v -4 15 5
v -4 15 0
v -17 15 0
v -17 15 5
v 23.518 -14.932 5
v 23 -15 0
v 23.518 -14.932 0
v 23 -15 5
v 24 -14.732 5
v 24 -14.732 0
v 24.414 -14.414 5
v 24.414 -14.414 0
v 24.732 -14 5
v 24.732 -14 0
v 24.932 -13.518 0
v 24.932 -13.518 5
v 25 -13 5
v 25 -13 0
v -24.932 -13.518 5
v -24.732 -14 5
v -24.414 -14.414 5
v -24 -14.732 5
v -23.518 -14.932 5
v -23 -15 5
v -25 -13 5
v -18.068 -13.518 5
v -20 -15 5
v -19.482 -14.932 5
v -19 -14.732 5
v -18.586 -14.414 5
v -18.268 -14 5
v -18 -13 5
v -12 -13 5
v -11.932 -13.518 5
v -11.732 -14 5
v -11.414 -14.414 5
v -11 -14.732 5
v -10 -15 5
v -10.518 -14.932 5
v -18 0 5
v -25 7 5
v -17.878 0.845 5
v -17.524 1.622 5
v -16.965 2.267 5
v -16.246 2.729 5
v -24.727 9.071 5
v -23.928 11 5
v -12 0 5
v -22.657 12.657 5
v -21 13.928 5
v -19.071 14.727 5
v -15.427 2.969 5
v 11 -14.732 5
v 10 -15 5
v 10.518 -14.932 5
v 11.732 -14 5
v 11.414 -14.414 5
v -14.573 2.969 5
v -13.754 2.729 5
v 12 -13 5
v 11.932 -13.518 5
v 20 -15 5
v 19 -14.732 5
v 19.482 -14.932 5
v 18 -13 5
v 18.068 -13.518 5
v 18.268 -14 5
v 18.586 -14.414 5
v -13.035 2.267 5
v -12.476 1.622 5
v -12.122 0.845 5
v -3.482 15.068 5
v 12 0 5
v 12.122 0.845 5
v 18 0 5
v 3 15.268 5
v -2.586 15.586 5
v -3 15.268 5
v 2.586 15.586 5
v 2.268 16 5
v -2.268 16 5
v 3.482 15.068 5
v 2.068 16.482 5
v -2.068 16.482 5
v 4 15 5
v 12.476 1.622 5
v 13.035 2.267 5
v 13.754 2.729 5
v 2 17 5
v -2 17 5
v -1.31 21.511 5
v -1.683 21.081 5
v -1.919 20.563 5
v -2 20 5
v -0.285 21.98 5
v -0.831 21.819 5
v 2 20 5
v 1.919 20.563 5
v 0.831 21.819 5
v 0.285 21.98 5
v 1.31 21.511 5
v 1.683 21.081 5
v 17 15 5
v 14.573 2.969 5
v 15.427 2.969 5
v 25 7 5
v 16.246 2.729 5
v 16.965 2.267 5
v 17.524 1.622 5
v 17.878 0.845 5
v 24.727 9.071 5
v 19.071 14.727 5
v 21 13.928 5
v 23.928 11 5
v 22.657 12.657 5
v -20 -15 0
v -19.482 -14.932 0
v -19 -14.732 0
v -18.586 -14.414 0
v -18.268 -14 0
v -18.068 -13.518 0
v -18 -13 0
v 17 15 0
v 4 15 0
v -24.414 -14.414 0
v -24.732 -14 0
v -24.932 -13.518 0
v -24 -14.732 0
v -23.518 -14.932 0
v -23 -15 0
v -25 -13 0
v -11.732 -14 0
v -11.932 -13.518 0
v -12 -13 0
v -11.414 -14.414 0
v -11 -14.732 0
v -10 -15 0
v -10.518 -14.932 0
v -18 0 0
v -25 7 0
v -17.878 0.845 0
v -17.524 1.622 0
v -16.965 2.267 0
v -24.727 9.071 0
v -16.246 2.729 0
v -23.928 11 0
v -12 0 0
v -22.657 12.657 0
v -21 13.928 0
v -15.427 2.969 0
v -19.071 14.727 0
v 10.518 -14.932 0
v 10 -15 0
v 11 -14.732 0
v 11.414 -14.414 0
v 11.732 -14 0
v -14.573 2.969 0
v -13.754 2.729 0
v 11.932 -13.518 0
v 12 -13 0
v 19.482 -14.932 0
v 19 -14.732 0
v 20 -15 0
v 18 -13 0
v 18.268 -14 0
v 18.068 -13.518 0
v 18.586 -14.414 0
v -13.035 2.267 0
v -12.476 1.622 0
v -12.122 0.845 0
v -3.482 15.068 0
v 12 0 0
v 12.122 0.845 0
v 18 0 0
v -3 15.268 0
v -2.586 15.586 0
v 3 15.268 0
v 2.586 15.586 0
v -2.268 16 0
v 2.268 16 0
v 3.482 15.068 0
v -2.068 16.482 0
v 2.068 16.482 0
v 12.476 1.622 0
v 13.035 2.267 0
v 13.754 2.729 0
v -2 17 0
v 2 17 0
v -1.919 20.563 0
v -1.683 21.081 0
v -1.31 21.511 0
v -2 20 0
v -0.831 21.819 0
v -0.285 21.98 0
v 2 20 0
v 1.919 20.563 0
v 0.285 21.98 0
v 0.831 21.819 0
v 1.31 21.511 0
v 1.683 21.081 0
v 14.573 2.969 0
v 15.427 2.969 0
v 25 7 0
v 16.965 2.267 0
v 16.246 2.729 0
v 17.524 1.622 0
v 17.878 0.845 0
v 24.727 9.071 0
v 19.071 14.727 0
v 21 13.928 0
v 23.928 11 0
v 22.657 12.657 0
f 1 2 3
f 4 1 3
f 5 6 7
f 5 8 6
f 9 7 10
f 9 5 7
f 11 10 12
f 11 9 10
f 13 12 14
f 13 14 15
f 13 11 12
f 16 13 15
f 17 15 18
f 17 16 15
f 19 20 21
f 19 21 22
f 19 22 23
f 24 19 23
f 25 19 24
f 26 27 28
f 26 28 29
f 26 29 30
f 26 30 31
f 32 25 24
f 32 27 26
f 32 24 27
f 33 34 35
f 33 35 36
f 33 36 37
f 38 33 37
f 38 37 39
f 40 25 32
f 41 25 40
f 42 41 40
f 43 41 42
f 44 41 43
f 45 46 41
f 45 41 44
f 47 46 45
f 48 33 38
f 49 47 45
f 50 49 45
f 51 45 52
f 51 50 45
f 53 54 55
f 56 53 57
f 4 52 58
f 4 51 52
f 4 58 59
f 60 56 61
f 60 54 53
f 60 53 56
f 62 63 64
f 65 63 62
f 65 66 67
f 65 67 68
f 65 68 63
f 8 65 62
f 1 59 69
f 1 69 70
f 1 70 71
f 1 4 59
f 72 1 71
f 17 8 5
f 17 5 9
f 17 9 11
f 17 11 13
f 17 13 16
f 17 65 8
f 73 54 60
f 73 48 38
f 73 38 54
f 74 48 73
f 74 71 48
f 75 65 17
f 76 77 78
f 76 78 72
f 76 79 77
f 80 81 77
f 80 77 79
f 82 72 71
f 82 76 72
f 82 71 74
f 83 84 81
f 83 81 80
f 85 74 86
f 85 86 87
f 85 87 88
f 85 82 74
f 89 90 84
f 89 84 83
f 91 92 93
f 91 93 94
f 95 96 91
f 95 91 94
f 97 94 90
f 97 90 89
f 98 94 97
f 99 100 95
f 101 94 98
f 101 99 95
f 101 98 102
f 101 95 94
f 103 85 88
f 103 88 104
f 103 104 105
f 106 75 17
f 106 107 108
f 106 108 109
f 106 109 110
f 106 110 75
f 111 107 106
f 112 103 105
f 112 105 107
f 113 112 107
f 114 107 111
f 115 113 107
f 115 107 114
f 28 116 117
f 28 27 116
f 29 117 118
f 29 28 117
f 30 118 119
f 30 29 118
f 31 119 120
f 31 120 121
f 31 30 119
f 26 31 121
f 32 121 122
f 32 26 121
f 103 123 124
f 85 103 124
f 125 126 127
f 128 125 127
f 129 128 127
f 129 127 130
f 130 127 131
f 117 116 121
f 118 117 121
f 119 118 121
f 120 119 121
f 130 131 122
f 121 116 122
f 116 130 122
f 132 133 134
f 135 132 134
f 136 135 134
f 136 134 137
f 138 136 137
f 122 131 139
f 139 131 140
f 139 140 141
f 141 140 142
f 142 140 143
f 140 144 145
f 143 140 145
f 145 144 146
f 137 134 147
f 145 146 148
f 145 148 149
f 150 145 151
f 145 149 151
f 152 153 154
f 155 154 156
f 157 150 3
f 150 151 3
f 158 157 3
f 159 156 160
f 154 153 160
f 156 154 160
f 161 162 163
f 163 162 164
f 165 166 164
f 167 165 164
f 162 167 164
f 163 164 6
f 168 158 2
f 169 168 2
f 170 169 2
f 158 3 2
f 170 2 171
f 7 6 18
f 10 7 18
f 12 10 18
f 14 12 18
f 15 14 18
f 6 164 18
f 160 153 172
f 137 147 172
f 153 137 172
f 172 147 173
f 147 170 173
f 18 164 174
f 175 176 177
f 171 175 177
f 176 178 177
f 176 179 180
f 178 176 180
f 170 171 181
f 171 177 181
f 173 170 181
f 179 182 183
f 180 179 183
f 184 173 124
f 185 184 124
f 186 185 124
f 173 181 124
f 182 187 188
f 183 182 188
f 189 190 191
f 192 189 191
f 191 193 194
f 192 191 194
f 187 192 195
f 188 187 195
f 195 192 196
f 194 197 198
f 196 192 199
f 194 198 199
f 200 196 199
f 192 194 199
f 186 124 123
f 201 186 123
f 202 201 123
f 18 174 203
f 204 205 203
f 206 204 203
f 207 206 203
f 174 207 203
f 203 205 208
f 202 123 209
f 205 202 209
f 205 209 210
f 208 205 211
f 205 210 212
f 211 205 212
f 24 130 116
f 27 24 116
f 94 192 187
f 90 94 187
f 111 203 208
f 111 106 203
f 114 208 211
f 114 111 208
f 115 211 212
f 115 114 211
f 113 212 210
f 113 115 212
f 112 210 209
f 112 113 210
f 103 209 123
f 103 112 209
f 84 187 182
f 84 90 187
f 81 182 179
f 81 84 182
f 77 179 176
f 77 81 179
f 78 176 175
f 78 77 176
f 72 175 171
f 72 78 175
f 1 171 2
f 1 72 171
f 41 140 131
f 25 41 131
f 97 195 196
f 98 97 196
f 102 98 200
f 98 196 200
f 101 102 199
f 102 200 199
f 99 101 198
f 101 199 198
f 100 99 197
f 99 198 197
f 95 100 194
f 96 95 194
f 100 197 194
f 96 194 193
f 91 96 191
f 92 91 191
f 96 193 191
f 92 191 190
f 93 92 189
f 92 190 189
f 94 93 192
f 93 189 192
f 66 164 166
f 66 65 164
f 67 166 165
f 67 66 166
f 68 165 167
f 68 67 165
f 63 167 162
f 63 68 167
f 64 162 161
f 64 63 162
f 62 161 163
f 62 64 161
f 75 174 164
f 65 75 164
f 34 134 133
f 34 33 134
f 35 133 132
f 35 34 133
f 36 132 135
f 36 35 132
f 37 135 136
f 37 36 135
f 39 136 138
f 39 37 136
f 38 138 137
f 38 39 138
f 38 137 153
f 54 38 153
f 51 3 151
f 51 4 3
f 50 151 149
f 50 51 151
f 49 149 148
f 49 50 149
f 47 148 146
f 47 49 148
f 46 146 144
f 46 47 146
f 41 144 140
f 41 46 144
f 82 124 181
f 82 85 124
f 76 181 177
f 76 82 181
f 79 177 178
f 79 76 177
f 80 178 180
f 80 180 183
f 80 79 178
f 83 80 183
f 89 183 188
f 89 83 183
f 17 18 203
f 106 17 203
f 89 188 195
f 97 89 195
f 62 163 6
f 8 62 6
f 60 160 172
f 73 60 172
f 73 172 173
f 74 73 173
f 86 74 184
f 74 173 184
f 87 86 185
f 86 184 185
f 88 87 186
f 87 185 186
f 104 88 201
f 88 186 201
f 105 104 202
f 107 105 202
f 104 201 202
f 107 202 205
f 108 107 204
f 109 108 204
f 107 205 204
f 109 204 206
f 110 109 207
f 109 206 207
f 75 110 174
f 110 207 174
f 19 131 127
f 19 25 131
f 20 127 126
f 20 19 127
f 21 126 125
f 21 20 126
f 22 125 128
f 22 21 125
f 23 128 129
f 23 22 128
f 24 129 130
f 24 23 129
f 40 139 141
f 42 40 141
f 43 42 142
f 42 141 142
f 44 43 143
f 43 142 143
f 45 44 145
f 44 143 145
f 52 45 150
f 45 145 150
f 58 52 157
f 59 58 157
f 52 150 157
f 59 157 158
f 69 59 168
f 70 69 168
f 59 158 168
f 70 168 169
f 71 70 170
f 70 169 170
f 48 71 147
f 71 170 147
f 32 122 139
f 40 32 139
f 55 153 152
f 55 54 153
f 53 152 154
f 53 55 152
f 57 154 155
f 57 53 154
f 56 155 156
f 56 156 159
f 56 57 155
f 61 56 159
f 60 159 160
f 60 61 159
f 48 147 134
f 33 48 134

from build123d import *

# Parameters (mm, degrees)
SZKIC1_R                    = 2
DODANIE_WYCI_GNI_CIE1_DEPTH = 5
ZAOKR_GLENIE1_R             = 2
ZAOKR_GLENIE2_R             = 8


with BuildPart() as part:
    # Szkic1 → Dodanie-wyciągnięcie1 (new body)
    with BuildSketch(Plane.XY):
        with BuildLine():
            ThreePointArc((12, 0), (15, 3), (18, 0))
            Line((18, 0), (18, -15))
            Line((18, -15), (25, -15))
            Line((25, -15), (25, 15))
            Line((25, 15), (2, 15))
            Line((2, 15), (-2, 15))
            Line((-2, 15), (-25, 15))
            Line((-25, 15), (-25, -15))
            Line((-25, -15), (-18, -15))
            Line((-18, -15), (-18, 0))
            ThreePointArc((-18, 0), (-15, 3), (-12, 0))
            Line((-12, 0), (-12, -15))
            Line((-12, -15), (12, -15))
            Line((12, -15), (12, 0))
        make_face()
        with BuildLine():
            Line((-2, 15), (2, 15))
            Line((2, 15), (2, 20))
            ThreePointArc((2, 20), (0, 18), (-2, 20))
            Line((-2, 20), (-2, 15))
        make_face()
        with Locations((0, 20)):
            Circle(SZKIC1_R)
    extrude(amount=DODANIE_WYCI_GNI_CIE1_DEPTH)

    # Zaokrąglenie1
    zaokr_glenie1_edges = [part.edges().sort_by_distance(p)[0] for p in [
        (12, -15, 2.5),
        (-12, -15, 2.5),
        (-18, -15, 2.5),
        (-25, -15, 2.5),
        (-2, 15, 2.5),
        (2, 15, 2.5),
        (25, -15, 2.5),
        (18, -15, 2.5),
    ]]
    fillet(zaokr_glenie1_edges, radius=ZAOKR_GLENIE1_R)

    # Zaokrąglenie2
    zaokr_glenie2_edges = [part.edges().sort_by_distance(p)[0] for p in [
        (-25, 15, 2.5),
        (25, 15, 2.5),
    ]]
    fillet(zaokr_glenie2_edges, radius=ZAOKR_GLENIE2_R)


solid = part.part
